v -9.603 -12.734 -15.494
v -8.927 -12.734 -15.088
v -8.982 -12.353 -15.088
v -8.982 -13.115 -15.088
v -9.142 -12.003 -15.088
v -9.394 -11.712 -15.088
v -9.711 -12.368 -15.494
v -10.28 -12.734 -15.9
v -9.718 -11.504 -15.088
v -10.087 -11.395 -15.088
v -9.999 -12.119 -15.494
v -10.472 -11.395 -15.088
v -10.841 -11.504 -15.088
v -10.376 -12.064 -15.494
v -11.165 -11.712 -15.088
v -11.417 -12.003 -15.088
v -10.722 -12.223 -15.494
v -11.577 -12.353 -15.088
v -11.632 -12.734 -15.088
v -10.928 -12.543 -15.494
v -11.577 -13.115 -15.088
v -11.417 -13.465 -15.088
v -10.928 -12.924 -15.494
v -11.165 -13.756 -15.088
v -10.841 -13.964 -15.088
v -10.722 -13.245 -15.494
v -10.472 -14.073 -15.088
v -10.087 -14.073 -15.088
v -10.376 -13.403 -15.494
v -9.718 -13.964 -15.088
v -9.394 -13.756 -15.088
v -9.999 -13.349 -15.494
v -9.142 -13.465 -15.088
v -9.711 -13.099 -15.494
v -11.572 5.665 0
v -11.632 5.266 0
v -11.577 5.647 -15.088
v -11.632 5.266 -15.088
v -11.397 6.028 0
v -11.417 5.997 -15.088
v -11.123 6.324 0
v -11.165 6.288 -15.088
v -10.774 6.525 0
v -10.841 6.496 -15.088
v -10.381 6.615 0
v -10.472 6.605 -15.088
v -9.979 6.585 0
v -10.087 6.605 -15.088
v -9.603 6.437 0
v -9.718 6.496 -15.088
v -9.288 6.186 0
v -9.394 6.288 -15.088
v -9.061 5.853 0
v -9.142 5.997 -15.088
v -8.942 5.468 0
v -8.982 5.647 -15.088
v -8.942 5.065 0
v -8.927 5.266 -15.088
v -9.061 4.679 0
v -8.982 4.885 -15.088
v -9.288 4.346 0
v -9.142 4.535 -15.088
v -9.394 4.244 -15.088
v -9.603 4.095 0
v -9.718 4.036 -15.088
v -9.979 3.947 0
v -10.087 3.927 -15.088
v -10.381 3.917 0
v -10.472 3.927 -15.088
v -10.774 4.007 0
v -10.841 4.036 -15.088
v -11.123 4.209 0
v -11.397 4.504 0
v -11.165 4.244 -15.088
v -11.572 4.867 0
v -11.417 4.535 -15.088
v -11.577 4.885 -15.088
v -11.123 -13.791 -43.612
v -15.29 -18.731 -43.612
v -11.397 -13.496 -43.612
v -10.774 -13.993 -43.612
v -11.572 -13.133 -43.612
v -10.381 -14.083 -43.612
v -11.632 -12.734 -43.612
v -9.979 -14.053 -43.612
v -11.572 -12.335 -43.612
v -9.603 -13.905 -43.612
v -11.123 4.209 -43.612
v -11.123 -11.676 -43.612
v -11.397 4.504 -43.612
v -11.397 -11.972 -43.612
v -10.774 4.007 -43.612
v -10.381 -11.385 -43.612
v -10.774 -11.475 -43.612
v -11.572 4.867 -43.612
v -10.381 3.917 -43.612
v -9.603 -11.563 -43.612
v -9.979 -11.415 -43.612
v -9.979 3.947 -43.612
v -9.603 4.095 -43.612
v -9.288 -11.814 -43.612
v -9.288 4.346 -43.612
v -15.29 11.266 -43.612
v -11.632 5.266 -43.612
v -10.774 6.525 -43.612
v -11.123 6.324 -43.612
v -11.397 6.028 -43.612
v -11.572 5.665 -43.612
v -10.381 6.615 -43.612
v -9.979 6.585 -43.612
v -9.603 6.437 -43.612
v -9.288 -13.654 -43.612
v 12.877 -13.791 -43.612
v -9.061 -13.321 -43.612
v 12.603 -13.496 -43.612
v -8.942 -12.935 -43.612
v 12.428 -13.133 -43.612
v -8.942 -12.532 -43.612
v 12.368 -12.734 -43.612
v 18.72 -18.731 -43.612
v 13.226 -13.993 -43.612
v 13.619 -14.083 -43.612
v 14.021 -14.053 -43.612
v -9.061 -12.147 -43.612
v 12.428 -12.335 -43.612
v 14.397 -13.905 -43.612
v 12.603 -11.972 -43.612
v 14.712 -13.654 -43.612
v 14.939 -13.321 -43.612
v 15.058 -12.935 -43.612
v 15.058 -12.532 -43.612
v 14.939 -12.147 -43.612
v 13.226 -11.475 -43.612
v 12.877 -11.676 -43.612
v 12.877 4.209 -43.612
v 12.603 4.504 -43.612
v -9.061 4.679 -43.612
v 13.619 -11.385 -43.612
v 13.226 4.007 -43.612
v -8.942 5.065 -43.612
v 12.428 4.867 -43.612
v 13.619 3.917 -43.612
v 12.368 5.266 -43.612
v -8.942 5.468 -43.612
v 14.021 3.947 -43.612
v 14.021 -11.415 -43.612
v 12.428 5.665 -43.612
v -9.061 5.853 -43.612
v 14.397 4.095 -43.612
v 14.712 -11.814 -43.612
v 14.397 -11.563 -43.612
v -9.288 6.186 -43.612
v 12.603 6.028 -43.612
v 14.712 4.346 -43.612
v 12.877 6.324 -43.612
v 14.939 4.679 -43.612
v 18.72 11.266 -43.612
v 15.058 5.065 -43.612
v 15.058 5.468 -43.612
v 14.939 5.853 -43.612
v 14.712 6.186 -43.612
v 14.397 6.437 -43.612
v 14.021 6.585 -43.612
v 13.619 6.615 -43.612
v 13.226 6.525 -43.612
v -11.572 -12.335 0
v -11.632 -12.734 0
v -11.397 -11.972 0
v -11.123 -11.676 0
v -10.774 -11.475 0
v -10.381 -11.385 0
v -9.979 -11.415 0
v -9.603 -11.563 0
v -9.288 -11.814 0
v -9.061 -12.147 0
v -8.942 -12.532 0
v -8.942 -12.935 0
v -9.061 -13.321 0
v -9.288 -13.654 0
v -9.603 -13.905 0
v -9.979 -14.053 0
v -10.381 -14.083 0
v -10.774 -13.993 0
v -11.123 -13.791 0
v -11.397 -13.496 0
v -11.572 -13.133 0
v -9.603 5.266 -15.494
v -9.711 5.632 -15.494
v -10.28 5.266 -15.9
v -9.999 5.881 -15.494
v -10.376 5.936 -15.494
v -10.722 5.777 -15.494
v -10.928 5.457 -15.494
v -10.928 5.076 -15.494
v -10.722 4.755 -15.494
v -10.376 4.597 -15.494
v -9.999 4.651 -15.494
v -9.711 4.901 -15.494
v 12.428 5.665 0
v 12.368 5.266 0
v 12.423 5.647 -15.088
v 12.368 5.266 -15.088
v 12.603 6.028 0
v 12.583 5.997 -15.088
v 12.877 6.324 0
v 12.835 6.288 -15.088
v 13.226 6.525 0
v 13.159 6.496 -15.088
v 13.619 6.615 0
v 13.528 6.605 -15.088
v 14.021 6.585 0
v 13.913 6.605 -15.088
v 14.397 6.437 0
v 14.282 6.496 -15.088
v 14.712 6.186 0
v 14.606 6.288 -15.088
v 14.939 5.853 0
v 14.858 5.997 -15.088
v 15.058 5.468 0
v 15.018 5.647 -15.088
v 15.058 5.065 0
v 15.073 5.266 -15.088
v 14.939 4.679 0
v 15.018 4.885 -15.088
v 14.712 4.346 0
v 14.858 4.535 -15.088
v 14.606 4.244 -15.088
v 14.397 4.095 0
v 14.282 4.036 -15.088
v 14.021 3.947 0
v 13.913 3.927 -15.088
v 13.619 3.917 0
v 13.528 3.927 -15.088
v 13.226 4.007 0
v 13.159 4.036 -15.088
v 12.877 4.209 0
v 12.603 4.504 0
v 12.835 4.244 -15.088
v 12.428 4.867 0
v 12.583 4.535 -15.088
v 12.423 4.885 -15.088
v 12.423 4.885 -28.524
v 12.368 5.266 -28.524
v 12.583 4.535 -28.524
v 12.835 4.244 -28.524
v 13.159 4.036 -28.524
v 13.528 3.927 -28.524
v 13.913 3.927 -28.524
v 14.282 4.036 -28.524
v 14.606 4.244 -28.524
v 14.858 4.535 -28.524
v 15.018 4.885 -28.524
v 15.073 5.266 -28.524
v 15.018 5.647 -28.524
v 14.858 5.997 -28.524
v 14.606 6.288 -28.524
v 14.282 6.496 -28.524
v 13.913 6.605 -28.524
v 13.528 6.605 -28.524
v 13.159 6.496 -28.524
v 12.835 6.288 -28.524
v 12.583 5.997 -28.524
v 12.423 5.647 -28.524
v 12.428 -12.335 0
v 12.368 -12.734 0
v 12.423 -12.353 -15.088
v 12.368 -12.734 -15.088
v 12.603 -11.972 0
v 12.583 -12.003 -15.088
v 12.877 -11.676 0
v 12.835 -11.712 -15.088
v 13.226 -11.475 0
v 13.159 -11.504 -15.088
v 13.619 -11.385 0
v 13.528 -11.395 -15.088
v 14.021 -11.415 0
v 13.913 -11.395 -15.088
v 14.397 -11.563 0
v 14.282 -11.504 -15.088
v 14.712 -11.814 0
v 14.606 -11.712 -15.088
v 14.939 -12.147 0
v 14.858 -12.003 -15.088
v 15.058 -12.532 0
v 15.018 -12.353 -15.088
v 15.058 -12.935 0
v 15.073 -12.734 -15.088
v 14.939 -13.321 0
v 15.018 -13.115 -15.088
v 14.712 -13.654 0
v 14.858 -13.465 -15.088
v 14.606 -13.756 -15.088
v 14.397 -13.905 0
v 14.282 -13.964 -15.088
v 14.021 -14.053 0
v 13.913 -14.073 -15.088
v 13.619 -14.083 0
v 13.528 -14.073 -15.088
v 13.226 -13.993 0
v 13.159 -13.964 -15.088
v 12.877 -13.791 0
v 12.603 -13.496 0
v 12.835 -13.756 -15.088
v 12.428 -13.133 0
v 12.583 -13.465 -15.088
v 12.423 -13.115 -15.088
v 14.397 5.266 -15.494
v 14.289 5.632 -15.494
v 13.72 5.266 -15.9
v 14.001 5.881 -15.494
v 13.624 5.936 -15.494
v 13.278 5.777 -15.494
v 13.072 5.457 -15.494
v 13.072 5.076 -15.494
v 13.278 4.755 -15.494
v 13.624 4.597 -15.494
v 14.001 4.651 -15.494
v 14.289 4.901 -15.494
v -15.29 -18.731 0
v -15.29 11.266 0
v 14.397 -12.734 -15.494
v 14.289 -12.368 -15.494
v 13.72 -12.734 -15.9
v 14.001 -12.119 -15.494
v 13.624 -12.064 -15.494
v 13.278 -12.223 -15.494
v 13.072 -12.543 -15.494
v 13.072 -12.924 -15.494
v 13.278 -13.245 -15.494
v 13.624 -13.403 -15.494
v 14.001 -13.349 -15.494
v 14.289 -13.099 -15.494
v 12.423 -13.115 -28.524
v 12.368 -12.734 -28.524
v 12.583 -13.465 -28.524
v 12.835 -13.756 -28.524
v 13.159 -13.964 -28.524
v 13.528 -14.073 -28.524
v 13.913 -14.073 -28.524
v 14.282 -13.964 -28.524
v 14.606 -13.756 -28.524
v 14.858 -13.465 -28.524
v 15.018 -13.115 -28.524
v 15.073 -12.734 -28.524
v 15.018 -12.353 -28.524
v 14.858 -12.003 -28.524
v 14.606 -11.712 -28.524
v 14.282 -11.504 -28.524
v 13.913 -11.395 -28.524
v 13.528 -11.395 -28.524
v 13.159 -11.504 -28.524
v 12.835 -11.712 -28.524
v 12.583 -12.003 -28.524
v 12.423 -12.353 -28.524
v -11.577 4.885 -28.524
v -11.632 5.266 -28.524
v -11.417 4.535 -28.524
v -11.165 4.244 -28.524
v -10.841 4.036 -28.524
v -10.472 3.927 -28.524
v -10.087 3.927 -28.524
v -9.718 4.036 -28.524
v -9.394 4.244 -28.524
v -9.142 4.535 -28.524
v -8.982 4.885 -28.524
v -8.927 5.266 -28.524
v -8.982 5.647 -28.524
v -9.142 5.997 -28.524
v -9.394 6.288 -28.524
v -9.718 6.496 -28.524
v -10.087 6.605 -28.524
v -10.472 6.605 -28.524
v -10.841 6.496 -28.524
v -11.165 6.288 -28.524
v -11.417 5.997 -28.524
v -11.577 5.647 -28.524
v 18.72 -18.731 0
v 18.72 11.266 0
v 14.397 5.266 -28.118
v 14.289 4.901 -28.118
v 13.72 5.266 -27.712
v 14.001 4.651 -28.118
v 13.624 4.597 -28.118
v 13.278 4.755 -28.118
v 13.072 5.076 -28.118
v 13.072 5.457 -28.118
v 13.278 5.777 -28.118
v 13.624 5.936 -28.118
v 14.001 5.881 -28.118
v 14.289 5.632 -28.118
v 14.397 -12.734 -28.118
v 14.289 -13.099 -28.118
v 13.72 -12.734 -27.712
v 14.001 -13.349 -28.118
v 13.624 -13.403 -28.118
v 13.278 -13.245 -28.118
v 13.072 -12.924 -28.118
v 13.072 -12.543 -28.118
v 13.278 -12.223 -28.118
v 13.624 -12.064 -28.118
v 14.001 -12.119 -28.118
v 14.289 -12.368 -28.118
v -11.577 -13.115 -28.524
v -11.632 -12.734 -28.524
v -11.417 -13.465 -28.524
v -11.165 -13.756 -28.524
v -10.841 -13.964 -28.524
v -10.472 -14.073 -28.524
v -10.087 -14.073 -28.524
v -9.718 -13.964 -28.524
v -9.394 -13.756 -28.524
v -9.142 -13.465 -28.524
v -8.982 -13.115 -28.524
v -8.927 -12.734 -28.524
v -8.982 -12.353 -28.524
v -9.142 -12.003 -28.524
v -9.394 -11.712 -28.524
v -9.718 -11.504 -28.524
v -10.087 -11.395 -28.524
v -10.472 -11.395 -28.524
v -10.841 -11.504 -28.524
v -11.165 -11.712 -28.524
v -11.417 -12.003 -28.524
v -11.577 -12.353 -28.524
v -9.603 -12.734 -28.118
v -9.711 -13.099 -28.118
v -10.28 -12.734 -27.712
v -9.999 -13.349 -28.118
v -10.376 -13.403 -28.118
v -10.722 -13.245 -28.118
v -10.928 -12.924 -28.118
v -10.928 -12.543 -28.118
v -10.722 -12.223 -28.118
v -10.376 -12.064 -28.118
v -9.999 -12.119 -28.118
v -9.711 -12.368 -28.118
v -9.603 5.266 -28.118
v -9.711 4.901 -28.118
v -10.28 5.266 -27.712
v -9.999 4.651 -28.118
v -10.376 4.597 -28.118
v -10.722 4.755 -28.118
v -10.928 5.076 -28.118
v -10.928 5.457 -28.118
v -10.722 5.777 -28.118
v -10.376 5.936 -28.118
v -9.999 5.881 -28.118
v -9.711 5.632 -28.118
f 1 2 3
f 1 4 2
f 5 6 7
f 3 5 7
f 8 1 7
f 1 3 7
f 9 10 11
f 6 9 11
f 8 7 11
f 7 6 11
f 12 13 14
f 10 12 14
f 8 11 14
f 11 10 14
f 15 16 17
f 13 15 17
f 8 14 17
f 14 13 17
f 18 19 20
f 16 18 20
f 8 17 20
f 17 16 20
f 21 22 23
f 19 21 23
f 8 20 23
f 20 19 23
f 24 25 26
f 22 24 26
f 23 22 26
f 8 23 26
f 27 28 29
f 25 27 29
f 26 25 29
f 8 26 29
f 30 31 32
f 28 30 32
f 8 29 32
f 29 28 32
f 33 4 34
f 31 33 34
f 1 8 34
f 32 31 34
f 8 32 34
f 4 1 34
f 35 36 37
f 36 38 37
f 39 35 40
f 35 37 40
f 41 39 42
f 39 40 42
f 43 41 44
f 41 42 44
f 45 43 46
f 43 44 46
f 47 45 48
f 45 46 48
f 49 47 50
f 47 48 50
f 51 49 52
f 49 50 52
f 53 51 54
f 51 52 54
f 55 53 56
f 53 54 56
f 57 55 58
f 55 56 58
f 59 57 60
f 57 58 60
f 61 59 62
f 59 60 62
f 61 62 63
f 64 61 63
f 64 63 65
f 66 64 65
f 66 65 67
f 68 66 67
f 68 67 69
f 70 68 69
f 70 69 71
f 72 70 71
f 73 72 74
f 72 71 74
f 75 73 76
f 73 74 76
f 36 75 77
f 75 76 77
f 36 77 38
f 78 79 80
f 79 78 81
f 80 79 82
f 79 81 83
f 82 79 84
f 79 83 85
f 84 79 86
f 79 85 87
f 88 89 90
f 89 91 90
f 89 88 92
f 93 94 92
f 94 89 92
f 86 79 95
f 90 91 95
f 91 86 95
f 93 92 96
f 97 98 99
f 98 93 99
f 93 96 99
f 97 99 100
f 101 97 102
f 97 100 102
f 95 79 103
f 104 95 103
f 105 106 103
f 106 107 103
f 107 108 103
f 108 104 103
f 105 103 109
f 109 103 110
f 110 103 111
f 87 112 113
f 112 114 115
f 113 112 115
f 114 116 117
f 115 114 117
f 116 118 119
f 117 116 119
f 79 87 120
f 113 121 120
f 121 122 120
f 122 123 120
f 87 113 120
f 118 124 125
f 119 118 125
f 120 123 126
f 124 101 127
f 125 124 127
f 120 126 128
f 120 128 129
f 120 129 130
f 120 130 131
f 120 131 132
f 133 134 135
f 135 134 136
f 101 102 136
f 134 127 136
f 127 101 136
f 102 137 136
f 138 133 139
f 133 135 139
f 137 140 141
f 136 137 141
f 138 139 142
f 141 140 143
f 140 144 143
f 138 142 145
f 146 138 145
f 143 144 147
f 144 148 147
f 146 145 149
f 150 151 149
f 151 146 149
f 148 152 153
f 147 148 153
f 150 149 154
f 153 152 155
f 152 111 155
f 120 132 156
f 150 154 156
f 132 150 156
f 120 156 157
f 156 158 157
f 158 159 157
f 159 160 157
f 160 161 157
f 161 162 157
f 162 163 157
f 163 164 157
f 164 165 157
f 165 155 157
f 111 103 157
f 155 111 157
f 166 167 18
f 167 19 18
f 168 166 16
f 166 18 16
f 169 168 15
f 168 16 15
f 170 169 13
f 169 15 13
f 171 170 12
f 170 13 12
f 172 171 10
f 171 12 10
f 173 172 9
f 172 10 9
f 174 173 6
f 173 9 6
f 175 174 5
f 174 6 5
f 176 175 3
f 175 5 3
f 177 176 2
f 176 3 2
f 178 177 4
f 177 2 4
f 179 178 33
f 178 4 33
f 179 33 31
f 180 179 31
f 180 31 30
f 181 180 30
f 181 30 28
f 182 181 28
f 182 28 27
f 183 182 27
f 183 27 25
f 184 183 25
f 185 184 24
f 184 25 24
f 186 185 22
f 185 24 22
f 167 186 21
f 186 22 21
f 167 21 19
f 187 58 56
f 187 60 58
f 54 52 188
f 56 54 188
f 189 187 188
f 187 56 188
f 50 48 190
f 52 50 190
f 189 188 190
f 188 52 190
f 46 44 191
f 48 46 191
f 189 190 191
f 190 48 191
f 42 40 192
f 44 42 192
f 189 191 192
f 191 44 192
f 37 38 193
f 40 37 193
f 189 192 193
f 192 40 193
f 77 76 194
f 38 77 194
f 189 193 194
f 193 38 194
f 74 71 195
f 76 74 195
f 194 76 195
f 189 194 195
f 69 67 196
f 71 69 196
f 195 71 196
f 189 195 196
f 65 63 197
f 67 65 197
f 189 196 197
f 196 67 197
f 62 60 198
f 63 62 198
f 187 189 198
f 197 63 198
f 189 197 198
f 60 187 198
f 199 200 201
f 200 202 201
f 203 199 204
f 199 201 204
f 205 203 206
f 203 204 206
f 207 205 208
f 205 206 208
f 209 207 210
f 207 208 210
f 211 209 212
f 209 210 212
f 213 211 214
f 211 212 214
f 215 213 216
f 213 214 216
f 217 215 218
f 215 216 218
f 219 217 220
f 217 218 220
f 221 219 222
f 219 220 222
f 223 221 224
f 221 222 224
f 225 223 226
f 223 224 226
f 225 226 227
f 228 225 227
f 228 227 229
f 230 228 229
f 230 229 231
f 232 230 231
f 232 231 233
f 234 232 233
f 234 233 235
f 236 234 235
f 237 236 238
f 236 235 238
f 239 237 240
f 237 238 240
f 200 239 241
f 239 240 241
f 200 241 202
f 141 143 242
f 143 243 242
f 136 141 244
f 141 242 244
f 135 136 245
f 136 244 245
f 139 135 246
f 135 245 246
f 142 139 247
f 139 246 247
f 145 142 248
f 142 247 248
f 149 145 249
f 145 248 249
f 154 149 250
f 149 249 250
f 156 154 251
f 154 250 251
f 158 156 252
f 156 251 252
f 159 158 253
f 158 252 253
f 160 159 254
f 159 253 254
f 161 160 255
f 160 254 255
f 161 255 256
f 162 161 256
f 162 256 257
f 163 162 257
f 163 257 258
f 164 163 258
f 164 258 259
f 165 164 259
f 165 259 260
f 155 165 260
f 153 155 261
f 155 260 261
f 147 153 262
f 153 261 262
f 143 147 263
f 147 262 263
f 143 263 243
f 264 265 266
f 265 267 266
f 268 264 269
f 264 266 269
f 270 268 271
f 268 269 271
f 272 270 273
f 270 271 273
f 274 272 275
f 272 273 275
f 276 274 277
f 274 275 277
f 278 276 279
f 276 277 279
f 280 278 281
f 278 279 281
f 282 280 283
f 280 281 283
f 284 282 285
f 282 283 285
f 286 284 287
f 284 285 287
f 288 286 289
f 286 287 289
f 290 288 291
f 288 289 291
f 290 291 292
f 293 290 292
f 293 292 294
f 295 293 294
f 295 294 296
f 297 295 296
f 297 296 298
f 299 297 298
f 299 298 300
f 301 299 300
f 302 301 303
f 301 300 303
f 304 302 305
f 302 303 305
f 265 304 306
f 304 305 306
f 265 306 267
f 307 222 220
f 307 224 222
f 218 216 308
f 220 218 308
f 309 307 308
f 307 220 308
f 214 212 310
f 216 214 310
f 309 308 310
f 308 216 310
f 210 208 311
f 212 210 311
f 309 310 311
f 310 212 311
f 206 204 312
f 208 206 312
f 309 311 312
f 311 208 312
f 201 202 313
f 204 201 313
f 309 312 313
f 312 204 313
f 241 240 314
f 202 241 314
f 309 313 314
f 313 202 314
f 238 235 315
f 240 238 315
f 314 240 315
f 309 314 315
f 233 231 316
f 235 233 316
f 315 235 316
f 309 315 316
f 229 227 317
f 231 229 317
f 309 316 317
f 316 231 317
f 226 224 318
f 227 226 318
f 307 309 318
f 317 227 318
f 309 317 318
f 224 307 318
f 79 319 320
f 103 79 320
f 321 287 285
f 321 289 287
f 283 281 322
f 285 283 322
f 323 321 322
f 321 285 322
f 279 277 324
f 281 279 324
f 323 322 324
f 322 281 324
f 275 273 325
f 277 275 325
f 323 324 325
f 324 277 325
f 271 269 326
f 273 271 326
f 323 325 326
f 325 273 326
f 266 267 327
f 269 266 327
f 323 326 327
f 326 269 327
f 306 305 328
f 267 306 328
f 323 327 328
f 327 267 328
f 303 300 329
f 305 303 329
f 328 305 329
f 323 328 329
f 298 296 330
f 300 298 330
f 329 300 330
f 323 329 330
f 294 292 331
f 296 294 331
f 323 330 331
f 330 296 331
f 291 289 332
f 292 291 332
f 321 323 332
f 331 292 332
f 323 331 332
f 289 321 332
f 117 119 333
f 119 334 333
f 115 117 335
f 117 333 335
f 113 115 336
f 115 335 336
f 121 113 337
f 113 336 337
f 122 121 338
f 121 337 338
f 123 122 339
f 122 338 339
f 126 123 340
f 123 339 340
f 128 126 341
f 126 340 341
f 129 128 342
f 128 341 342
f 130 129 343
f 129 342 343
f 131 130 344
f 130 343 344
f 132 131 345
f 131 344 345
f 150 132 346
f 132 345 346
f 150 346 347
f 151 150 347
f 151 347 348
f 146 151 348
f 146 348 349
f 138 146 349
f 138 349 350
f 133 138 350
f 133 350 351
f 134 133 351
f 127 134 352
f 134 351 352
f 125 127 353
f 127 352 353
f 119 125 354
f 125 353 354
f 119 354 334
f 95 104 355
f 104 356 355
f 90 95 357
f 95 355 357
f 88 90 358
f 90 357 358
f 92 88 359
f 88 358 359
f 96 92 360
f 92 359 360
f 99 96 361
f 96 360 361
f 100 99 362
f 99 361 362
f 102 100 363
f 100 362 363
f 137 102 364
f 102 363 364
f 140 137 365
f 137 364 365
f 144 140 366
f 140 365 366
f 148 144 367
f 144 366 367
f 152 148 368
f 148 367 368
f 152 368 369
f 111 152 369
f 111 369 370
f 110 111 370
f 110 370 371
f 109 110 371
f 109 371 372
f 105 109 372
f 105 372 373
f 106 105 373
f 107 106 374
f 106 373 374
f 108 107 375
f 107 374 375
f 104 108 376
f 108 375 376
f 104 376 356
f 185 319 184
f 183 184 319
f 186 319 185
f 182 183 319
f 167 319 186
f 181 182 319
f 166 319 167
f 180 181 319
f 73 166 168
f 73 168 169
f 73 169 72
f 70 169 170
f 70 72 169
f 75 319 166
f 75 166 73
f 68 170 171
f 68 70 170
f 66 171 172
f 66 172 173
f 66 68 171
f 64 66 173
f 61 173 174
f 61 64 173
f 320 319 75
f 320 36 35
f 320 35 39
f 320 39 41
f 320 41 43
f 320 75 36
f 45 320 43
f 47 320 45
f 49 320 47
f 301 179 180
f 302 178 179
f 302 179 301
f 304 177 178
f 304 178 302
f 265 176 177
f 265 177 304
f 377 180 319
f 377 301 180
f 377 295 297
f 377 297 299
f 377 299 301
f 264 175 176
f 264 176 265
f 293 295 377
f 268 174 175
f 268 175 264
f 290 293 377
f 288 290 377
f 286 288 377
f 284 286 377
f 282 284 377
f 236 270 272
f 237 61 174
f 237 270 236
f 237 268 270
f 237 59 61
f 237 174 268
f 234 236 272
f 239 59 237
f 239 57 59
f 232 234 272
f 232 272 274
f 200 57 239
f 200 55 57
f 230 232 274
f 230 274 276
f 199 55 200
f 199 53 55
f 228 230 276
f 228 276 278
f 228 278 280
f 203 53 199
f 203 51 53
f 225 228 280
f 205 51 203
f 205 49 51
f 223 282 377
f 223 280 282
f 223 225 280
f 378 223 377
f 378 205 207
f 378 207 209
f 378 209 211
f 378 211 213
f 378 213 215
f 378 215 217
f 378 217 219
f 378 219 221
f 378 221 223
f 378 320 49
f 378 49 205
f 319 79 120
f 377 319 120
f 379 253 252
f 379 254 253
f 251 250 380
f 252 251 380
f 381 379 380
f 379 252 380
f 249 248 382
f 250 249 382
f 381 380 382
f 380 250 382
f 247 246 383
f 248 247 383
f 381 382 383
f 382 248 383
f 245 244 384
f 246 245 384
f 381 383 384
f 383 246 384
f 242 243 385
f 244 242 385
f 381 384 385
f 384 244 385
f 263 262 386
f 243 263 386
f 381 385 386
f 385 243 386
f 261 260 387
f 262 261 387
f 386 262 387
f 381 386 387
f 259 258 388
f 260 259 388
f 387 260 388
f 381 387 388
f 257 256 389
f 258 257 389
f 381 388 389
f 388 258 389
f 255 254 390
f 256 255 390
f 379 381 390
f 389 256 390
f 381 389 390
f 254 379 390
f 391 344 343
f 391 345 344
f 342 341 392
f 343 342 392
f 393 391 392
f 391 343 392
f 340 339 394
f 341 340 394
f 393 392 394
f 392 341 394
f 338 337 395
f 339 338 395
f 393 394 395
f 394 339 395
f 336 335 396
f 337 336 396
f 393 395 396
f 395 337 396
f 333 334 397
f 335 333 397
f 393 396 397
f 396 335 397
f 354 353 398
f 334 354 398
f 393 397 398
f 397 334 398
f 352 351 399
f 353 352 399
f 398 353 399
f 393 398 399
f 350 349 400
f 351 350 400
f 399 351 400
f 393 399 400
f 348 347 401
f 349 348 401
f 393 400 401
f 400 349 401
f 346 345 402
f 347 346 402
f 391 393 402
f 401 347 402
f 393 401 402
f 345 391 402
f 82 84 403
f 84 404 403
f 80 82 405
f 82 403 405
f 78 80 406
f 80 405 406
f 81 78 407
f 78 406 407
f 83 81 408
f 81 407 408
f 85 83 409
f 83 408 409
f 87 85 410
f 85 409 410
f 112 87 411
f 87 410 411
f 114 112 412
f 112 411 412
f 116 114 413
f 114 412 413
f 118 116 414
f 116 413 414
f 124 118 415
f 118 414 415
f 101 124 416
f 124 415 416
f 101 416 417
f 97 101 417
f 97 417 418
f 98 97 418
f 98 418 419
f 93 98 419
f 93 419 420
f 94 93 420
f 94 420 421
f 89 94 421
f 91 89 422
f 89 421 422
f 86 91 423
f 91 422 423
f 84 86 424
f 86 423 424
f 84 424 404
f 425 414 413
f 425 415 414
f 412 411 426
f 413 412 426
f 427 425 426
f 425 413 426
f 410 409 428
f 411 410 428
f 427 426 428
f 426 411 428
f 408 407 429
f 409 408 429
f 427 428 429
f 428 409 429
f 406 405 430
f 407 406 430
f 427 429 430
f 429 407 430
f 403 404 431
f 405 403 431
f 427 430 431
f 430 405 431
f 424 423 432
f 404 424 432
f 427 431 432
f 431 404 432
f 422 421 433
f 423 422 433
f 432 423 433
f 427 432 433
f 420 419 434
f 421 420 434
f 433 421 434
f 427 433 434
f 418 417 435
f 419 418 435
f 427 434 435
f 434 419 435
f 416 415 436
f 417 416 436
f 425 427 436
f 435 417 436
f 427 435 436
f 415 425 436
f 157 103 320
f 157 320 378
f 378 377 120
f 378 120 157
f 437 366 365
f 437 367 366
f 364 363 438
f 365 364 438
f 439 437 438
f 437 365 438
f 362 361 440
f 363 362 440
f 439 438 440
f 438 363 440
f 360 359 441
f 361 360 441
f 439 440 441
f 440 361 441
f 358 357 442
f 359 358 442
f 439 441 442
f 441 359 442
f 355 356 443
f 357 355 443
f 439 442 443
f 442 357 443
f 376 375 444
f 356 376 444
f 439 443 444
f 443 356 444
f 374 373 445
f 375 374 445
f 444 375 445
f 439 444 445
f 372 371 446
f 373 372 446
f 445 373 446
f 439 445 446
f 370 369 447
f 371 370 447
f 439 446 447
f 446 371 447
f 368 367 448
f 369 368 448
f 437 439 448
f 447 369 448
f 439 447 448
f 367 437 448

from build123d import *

# Parameters (mm, degrees)
F0_W           = 34.0106
F0_H           = 29.9974
F1_DEPTH       = 43.6118
F4_D           = 2.7051
F4_DEPTH       = 15.0876
F4_TIP         = 0.8126940303
F4_ON_F2_D     = 2.7051
F4_ON_F2_DEPTH = 15.0876
F4_ON_F2_TIP   = 0.8126940303


with BuildPart() as f1:
    # F0 (on Top) → F1 (new body)
    with BuildSketch(Plane.XY):
        with Locations((1.7151954423, -3.7325670248)):
            Rectangle(F0_W, F0_H)
    extrude(amount=-F1_DEPTH)

    # F4
    with Locations(Plane(origin=(0, 0, -43.6118), x_dir=(1, 0, 0), z_dir=(0, 0, -1))):
        with Locations((-10.2795045577, 12.7338670235), (13.7204954423, 12.7338670235), (13.7204954423, -5.2661329765), (-10.2795045577, -5.2661329765)):
            Hole(F4_D / 2, depth=F4_DEPTH)
            with Locations((0, 0, -(F4_DEPTH + F4_TIP / 2))):  # 118° drill point
                Cone(0, F4_D / 2, F4_TIP, mode=Mode.SUBTRACT)

    # F4 on F2
    with Locations(Plane.XY):
        with Locations((-10.2795045577, 5.2661329765), (13.7204954423, 5.2661329765), (13.7204954423, -12.7338670235), (-10.2795045577, -12.7338670235)):
            Hole(F4_ON_F2_D / 2, depth=F4_ON_F2_DEPTH)
            with Locations((0, 0, -(F4_ON_F2_DEPTH + F4_ON_F2_TIP / 2))):  # 118° drill point
                Cone(0, F4_ON_F2_D / 2, F4_ON_F2_TIP, mode=Mode.SUBTRACT)


solid = f1.part
